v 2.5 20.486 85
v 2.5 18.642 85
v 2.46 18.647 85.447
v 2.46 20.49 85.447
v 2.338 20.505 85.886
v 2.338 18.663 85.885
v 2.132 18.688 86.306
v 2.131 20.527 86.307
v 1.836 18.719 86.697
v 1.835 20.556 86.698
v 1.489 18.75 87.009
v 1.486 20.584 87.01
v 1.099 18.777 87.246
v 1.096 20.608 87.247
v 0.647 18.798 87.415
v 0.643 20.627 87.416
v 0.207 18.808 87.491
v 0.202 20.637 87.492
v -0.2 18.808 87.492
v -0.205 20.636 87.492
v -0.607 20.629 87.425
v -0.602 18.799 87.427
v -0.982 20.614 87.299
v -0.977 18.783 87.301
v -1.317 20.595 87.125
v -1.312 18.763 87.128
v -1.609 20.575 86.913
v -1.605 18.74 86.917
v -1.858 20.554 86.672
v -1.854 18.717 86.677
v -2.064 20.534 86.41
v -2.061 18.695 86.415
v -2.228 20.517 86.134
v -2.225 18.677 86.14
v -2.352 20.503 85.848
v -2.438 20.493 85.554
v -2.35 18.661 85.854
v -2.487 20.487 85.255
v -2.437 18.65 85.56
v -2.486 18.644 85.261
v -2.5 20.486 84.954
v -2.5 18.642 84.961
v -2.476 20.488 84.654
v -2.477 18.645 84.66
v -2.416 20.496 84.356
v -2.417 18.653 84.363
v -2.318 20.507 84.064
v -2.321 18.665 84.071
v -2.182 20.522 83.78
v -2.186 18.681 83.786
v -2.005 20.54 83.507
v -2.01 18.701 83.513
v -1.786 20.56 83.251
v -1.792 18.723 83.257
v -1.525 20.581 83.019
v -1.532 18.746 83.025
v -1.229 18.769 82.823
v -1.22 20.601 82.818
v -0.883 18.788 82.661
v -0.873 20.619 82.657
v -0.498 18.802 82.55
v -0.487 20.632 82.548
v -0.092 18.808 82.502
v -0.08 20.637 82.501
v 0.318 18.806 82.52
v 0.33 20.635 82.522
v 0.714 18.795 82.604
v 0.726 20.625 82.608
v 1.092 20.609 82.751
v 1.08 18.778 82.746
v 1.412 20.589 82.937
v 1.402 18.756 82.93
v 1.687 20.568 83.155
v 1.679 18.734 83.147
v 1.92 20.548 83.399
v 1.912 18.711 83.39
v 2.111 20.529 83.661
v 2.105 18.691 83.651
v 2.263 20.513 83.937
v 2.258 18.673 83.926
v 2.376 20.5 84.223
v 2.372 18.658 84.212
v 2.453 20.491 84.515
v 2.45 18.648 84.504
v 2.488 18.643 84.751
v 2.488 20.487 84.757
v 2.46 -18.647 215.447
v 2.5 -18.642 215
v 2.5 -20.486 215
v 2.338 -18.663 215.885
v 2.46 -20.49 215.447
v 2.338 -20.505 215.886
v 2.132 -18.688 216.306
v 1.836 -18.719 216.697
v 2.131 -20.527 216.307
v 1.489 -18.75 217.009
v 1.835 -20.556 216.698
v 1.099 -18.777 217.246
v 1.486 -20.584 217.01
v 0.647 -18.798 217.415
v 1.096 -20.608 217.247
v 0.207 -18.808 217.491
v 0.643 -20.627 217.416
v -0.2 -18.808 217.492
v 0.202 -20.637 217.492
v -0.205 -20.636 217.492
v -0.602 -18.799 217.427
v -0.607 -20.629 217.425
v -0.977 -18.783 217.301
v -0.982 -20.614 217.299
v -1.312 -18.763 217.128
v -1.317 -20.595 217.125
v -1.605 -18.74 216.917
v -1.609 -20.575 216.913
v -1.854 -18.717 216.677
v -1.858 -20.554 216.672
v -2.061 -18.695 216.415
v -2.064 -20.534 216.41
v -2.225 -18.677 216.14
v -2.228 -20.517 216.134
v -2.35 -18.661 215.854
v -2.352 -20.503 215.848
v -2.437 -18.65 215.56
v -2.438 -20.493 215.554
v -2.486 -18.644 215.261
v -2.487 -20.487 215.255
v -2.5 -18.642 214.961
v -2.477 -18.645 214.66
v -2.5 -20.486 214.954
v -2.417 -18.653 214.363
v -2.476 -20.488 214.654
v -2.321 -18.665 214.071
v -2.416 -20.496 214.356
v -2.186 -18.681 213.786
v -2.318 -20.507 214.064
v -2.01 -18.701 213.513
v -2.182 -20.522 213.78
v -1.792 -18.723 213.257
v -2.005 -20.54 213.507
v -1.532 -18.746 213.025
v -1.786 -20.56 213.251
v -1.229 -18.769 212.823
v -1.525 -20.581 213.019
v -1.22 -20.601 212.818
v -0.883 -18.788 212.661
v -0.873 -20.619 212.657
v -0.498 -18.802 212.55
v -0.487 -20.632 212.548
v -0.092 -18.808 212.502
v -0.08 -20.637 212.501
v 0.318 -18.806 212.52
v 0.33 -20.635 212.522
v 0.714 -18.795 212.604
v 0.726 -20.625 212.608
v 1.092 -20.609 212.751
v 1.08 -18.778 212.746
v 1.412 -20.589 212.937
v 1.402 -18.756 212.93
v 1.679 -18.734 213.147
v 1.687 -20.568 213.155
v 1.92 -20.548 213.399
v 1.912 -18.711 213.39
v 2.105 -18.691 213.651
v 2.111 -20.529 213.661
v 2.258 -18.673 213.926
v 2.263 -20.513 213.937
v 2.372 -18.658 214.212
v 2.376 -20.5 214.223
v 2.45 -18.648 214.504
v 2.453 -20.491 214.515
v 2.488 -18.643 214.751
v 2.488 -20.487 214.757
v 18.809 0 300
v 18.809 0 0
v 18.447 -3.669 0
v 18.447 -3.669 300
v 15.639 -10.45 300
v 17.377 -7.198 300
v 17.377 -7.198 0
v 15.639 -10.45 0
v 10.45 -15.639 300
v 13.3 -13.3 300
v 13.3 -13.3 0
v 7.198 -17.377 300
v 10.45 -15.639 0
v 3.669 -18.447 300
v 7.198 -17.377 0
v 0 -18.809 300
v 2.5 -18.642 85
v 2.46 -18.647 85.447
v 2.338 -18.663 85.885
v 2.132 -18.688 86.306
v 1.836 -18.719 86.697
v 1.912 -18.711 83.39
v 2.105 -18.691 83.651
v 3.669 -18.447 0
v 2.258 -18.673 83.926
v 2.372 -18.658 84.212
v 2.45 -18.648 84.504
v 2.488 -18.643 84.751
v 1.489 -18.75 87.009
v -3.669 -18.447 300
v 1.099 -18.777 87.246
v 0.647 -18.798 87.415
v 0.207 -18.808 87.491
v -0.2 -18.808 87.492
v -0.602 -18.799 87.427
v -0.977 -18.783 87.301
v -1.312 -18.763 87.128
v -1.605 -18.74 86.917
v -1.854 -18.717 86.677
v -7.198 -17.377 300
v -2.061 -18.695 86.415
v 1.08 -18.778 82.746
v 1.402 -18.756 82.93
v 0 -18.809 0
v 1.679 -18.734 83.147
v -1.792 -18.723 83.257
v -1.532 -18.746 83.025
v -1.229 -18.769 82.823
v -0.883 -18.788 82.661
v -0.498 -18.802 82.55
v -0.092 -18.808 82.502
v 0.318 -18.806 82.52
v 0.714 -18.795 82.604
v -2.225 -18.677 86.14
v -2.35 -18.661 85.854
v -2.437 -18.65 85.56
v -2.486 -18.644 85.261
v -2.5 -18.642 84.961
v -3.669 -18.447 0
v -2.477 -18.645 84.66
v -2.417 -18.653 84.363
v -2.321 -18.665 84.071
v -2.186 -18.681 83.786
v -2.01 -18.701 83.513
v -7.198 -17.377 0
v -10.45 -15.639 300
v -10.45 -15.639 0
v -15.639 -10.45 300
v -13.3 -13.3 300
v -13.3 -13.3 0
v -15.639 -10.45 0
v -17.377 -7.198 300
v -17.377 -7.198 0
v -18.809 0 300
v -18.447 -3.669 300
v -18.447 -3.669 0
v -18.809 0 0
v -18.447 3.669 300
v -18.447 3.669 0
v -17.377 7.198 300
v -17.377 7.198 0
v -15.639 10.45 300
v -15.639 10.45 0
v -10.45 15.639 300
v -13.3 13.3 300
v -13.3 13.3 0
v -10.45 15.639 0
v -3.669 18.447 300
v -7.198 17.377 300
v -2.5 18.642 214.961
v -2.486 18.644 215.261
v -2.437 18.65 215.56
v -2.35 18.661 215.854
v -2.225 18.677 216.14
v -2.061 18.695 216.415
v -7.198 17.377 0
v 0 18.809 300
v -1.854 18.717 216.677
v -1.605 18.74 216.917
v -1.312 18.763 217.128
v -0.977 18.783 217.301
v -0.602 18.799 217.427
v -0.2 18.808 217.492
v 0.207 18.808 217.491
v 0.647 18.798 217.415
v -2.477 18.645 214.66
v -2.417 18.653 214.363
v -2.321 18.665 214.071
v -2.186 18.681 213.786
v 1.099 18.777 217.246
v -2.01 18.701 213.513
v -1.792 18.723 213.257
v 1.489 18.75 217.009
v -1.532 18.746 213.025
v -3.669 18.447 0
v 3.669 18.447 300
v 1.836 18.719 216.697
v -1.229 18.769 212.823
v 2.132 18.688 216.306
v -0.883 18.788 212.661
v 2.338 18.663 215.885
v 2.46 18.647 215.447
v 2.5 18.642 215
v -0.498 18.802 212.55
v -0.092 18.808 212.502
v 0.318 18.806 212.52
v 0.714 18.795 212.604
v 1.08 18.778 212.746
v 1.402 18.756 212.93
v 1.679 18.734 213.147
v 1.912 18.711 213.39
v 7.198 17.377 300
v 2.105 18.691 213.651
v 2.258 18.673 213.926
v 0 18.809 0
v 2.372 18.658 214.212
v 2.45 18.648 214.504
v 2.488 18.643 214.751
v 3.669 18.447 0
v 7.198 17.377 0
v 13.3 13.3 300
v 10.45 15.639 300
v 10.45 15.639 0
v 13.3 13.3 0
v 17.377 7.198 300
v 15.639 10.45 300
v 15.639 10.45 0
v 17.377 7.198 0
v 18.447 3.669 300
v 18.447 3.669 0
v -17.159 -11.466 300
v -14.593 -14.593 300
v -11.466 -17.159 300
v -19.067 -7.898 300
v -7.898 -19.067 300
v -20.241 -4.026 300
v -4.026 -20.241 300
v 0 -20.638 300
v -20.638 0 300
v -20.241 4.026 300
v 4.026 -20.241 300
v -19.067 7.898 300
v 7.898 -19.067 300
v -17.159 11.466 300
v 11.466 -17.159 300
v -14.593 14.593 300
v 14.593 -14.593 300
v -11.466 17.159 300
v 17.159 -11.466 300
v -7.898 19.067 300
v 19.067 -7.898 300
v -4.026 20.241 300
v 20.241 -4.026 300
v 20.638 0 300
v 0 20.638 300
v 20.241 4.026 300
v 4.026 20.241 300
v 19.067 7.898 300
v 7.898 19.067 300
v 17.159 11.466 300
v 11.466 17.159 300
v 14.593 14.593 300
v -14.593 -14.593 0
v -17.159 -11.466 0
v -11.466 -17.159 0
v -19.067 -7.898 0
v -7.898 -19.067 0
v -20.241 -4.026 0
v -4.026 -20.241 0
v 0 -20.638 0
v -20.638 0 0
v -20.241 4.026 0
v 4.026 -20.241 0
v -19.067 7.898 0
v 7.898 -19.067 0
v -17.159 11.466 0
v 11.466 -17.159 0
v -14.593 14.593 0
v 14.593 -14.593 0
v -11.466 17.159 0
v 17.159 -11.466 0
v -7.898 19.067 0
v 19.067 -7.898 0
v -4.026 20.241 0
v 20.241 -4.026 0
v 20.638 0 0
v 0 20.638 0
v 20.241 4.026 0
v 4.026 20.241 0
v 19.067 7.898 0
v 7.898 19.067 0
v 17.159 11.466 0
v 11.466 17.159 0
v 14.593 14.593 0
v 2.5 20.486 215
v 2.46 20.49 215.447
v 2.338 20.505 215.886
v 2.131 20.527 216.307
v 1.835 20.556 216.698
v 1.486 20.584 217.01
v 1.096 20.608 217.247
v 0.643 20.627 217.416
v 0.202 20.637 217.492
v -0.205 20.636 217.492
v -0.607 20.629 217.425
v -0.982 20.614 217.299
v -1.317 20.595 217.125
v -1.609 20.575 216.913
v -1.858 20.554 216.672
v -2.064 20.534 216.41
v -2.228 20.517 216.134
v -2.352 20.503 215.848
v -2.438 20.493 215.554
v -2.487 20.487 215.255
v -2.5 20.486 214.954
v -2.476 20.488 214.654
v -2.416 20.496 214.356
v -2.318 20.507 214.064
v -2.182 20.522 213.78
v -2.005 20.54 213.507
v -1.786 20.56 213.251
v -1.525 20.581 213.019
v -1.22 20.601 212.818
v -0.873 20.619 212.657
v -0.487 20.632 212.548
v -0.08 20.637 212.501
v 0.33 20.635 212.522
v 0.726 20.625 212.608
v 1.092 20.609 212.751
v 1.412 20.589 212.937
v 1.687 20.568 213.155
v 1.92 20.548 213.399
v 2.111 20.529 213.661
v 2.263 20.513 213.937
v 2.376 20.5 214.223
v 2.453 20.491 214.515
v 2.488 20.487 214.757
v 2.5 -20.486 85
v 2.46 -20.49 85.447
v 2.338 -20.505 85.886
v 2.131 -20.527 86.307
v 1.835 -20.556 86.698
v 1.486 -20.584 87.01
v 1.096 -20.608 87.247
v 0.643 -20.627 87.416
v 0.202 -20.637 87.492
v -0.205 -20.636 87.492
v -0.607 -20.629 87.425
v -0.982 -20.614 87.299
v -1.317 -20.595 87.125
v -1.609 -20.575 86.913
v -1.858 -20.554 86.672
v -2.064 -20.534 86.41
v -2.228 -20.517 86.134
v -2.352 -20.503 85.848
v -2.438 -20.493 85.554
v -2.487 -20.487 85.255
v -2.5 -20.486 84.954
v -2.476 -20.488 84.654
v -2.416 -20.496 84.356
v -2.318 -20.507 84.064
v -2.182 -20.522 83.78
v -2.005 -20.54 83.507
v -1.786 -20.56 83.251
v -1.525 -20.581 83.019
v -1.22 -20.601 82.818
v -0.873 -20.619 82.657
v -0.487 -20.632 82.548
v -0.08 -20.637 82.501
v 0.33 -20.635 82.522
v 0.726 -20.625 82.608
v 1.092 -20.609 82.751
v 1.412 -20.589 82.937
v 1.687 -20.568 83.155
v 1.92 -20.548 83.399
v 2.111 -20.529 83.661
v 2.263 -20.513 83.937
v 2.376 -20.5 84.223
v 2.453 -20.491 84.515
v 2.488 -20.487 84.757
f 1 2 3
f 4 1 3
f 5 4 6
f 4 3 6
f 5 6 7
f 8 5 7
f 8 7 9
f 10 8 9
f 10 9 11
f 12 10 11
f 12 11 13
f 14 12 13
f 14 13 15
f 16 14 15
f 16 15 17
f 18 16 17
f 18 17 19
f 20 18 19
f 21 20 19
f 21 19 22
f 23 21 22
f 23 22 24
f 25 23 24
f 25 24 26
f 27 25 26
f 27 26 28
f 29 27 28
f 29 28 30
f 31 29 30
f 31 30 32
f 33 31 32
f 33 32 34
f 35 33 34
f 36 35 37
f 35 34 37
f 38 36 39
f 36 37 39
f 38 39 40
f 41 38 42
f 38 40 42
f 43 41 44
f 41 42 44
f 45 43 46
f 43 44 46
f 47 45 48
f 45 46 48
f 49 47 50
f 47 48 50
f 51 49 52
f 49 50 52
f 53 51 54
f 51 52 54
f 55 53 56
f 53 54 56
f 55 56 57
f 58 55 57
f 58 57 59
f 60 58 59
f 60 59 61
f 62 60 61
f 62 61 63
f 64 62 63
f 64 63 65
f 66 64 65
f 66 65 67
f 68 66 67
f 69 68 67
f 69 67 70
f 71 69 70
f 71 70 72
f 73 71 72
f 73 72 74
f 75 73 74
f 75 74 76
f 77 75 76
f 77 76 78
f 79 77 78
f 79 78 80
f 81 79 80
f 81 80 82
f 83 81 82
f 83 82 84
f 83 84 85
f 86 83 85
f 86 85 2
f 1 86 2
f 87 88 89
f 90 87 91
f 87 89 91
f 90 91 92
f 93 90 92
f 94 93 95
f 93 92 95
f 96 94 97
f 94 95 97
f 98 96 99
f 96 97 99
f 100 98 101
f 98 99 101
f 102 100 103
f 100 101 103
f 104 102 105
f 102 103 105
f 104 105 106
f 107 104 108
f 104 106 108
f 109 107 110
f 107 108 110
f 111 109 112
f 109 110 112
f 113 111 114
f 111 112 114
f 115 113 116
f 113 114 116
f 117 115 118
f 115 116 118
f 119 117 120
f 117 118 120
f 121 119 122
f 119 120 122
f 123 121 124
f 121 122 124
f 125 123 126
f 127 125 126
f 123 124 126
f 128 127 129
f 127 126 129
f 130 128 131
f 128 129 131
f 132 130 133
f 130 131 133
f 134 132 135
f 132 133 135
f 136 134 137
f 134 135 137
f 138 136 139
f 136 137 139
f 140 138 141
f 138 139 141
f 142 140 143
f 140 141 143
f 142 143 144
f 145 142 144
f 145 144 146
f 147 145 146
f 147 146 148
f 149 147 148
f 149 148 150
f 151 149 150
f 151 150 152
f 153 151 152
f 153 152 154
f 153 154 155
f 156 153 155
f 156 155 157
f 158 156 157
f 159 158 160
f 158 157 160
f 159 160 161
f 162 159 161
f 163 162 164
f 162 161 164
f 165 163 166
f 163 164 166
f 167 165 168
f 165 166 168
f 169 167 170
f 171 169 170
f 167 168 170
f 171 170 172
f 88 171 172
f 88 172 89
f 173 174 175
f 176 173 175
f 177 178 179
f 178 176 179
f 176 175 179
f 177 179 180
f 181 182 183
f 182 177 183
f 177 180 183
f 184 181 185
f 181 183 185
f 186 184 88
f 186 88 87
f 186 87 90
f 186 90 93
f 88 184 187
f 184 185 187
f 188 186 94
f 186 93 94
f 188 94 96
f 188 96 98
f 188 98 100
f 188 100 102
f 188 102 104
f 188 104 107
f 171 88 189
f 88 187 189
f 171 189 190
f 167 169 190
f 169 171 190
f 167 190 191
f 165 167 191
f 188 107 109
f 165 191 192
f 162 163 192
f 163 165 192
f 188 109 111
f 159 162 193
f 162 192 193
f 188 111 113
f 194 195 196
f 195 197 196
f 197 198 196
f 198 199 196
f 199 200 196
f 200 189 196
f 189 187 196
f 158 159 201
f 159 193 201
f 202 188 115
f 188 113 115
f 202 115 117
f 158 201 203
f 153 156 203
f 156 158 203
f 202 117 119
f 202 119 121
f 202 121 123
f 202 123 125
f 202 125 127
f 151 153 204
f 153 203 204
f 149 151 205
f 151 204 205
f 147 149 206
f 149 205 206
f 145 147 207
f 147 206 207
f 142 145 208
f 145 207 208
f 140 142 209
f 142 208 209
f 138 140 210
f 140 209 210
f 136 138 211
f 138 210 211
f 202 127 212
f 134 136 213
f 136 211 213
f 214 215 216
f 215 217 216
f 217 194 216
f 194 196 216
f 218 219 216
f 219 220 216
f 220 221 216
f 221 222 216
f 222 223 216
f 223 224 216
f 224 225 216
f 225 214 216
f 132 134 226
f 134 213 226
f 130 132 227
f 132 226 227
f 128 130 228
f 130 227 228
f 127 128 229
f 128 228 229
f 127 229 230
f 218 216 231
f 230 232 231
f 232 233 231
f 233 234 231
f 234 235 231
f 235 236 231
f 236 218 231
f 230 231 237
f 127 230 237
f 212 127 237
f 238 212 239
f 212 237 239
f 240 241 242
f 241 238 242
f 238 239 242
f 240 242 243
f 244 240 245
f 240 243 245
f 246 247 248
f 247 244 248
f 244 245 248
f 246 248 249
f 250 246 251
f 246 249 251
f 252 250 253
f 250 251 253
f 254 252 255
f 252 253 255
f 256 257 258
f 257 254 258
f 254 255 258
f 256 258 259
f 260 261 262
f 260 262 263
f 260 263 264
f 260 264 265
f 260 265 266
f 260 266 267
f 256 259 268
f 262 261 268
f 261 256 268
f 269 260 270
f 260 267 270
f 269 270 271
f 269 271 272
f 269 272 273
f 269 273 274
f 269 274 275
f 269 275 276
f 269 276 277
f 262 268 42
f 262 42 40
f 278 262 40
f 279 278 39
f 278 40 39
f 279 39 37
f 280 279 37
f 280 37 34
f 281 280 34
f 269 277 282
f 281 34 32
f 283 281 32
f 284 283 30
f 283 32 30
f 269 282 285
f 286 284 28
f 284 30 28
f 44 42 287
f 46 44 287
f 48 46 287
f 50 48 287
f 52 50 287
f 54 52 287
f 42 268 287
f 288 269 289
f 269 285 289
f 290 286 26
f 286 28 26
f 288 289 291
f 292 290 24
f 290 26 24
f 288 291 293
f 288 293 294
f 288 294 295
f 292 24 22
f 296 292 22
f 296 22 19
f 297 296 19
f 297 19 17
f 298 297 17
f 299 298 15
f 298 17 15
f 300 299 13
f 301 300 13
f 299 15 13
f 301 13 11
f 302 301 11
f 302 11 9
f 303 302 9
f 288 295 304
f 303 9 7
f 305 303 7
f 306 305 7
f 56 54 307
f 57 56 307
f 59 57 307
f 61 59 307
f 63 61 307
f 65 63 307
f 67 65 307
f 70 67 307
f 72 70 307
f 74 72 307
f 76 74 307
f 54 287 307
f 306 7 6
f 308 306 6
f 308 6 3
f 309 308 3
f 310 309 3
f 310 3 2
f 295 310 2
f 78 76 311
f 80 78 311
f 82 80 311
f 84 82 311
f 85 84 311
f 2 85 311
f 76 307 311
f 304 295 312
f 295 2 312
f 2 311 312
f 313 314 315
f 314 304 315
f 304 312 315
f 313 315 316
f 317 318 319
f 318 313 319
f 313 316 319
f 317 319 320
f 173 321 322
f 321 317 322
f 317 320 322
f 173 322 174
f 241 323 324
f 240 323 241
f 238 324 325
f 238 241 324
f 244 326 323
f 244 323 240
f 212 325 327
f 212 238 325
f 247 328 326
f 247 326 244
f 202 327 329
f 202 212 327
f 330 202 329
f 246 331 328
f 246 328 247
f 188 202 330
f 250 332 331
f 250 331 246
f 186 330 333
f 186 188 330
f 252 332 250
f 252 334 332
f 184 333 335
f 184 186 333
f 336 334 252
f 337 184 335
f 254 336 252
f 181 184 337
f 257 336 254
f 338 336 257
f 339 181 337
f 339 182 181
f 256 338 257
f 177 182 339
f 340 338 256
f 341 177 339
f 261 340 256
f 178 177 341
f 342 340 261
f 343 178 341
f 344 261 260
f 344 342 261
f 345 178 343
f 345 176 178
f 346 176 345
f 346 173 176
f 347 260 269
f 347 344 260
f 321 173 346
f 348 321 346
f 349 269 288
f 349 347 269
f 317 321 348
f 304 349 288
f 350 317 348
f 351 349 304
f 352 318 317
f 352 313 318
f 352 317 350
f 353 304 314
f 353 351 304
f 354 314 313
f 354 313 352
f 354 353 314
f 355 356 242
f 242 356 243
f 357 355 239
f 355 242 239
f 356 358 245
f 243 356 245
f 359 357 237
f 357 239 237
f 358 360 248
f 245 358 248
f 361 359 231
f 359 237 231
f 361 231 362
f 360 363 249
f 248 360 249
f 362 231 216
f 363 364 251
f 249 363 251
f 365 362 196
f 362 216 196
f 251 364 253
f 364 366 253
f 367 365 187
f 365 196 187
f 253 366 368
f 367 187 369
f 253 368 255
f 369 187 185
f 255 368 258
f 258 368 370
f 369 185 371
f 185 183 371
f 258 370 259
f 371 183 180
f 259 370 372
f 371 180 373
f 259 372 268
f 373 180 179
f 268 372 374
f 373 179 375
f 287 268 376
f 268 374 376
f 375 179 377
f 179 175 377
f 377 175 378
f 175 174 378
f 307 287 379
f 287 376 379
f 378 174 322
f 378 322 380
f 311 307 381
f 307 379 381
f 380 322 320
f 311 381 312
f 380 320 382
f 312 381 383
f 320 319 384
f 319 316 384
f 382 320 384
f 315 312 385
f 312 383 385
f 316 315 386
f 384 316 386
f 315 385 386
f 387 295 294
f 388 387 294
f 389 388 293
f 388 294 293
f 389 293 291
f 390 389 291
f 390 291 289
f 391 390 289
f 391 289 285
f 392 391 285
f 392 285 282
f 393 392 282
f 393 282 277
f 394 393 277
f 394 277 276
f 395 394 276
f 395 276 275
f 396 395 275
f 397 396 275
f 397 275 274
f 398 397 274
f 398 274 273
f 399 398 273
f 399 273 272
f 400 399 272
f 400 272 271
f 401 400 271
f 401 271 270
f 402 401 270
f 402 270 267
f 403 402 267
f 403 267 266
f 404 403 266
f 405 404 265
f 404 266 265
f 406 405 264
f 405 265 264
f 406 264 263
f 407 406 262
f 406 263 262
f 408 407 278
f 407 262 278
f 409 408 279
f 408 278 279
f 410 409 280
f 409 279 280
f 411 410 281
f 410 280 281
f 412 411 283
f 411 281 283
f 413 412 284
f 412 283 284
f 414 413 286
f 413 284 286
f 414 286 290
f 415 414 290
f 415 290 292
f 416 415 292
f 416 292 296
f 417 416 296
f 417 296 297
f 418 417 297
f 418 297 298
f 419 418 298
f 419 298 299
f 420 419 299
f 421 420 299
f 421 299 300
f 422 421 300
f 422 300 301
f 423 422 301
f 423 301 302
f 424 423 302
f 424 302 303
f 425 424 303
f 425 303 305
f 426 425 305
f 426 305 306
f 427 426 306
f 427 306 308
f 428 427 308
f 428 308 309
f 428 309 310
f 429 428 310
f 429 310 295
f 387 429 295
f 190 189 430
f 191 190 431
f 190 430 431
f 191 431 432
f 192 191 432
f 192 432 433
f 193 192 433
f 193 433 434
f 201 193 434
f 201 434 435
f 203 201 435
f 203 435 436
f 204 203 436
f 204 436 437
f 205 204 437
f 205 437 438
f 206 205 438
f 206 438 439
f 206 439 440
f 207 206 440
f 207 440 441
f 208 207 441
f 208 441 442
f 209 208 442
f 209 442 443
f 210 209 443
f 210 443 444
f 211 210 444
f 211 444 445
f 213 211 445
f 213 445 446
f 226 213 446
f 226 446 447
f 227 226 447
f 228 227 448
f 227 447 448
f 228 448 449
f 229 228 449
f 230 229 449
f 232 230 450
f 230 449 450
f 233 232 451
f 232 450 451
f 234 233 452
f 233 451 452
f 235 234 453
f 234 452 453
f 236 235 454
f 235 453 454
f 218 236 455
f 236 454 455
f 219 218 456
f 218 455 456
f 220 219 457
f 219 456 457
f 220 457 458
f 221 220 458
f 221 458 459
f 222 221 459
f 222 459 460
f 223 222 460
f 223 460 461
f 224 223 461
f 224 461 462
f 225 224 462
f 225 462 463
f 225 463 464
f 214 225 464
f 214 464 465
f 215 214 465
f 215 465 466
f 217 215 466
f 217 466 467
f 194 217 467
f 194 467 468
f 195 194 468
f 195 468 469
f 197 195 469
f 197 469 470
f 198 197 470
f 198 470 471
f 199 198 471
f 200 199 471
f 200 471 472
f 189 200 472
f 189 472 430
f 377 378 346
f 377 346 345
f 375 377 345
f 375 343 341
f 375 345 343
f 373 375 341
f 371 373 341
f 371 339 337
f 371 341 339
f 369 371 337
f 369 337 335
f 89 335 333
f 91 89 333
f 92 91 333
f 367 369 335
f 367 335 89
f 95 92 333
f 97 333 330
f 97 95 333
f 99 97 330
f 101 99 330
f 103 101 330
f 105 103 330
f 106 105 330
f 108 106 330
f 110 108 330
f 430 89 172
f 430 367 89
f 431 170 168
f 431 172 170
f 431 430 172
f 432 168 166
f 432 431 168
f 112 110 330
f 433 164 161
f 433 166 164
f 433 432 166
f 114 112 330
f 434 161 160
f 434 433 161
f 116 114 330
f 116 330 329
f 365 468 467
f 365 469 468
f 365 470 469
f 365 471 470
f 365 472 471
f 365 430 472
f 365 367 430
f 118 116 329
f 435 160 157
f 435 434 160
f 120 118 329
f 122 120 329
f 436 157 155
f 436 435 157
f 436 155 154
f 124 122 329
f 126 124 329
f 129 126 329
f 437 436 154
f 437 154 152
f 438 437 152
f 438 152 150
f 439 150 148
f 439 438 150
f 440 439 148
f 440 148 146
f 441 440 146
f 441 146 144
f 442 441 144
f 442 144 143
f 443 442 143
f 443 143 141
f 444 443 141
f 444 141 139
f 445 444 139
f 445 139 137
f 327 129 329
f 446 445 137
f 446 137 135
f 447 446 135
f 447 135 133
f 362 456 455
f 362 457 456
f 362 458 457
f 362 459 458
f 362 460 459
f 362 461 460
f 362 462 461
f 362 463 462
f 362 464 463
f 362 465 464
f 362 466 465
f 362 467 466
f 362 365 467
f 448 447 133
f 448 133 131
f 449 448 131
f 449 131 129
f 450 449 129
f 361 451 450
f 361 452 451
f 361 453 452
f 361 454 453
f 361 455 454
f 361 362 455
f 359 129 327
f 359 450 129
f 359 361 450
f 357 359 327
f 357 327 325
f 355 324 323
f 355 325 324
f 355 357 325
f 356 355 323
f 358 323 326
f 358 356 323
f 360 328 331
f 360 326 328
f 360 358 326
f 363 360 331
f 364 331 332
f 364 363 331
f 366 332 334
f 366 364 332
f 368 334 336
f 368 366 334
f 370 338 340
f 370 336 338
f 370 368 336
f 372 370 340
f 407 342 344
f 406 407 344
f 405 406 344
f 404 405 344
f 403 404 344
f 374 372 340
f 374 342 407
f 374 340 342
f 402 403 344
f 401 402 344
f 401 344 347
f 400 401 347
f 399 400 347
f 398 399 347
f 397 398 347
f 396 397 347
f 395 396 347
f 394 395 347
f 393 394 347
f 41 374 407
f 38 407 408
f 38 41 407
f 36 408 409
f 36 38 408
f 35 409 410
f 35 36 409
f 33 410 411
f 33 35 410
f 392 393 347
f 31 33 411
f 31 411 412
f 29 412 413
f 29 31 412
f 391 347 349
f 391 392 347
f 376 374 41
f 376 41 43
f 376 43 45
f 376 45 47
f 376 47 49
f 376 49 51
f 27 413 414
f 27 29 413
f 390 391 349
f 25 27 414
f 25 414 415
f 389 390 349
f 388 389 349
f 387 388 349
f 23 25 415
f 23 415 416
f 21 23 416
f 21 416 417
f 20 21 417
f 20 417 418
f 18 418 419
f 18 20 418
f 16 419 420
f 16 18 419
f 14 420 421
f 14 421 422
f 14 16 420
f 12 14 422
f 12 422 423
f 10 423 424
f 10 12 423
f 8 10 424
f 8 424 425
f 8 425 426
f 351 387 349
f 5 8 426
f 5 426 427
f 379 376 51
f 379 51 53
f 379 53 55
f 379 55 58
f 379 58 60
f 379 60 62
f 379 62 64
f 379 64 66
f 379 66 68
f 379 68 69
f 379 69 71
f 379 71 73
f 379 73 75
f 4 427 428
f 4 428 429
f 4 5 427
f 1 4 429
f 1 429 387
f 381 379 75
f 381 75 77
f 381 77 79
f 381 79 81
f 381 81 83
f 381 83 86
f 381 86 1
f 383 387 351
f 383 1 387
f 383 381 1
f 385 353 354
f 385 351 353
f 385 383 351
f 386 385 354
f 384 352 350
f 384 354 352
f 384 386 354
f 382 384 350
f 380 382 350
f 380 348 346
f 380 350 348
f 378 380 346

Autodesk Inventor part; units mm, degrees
ref_plane "YZ Plane" through (0, 0, 0) normal (1, 0, 0) x (0, 1, 0)
ref_plane "XZ Plane" through (0, 0, 0) normal (0, 1, 0) x (-1, 0, 0)
ref_plane "XY Plane" through (0, 0, 0) normal (0, 0, 1) x (1, 0, 0)
sketch "Sketch1" plane through (0, 0, 0) normal (0, 0, 1) x (1, 0, 0)
  circle A0 centre (0, 0) radius 18.8087
  circle A1 centre (0, 0) radius 20.6375
  dimension "d0" = 37.6174
  dimension "d1" = 41.275
extrude "Extrusion1" add sketch "Sketch1" along normal blind 300
ref_plane "Work Plane1" through (-18.8087, 0, 0) normal (0, -1, 0) x (1, 0, 0)
sketch "Sketch3" plane through (-18.8087, 0, 0) normal (0, -1, 0) x (1, 0, 0)
  line L0 (18.8087, 0) -> (18.8087, 150)
  line L1 (18.8087, 0) -> (18.8087, 300) projected
  line L2 (18.8087, 150) -> (18.8087, 90)
  line L3 (18.8087, 90) -> (18.8087, 210)
  line L4 (18.8087, 90) -> (18.8087, 85)
  line L5 (18.8087, 210) -> (18.8087, 215)
  circle A0 centre (18.8087, 215) radius 2.5
  circle A1 centre (18.8087, 85) radius 2.5
  dimension "d6" = 150
  dimension "d7" = 60
  dimension "d8" = 120
  dimension "d9" = 5
  dimension "d10" = 5
  dimension "d11" = 5
  dimension "d12" = 5
extrude "Extrusion3" cut sketch "Sketch3" along normal mid plane 300
properties part number "4000_Cu_Bias_Shielding_(McMaster_50475K18)_MPSv2_v1" material "Copper"
